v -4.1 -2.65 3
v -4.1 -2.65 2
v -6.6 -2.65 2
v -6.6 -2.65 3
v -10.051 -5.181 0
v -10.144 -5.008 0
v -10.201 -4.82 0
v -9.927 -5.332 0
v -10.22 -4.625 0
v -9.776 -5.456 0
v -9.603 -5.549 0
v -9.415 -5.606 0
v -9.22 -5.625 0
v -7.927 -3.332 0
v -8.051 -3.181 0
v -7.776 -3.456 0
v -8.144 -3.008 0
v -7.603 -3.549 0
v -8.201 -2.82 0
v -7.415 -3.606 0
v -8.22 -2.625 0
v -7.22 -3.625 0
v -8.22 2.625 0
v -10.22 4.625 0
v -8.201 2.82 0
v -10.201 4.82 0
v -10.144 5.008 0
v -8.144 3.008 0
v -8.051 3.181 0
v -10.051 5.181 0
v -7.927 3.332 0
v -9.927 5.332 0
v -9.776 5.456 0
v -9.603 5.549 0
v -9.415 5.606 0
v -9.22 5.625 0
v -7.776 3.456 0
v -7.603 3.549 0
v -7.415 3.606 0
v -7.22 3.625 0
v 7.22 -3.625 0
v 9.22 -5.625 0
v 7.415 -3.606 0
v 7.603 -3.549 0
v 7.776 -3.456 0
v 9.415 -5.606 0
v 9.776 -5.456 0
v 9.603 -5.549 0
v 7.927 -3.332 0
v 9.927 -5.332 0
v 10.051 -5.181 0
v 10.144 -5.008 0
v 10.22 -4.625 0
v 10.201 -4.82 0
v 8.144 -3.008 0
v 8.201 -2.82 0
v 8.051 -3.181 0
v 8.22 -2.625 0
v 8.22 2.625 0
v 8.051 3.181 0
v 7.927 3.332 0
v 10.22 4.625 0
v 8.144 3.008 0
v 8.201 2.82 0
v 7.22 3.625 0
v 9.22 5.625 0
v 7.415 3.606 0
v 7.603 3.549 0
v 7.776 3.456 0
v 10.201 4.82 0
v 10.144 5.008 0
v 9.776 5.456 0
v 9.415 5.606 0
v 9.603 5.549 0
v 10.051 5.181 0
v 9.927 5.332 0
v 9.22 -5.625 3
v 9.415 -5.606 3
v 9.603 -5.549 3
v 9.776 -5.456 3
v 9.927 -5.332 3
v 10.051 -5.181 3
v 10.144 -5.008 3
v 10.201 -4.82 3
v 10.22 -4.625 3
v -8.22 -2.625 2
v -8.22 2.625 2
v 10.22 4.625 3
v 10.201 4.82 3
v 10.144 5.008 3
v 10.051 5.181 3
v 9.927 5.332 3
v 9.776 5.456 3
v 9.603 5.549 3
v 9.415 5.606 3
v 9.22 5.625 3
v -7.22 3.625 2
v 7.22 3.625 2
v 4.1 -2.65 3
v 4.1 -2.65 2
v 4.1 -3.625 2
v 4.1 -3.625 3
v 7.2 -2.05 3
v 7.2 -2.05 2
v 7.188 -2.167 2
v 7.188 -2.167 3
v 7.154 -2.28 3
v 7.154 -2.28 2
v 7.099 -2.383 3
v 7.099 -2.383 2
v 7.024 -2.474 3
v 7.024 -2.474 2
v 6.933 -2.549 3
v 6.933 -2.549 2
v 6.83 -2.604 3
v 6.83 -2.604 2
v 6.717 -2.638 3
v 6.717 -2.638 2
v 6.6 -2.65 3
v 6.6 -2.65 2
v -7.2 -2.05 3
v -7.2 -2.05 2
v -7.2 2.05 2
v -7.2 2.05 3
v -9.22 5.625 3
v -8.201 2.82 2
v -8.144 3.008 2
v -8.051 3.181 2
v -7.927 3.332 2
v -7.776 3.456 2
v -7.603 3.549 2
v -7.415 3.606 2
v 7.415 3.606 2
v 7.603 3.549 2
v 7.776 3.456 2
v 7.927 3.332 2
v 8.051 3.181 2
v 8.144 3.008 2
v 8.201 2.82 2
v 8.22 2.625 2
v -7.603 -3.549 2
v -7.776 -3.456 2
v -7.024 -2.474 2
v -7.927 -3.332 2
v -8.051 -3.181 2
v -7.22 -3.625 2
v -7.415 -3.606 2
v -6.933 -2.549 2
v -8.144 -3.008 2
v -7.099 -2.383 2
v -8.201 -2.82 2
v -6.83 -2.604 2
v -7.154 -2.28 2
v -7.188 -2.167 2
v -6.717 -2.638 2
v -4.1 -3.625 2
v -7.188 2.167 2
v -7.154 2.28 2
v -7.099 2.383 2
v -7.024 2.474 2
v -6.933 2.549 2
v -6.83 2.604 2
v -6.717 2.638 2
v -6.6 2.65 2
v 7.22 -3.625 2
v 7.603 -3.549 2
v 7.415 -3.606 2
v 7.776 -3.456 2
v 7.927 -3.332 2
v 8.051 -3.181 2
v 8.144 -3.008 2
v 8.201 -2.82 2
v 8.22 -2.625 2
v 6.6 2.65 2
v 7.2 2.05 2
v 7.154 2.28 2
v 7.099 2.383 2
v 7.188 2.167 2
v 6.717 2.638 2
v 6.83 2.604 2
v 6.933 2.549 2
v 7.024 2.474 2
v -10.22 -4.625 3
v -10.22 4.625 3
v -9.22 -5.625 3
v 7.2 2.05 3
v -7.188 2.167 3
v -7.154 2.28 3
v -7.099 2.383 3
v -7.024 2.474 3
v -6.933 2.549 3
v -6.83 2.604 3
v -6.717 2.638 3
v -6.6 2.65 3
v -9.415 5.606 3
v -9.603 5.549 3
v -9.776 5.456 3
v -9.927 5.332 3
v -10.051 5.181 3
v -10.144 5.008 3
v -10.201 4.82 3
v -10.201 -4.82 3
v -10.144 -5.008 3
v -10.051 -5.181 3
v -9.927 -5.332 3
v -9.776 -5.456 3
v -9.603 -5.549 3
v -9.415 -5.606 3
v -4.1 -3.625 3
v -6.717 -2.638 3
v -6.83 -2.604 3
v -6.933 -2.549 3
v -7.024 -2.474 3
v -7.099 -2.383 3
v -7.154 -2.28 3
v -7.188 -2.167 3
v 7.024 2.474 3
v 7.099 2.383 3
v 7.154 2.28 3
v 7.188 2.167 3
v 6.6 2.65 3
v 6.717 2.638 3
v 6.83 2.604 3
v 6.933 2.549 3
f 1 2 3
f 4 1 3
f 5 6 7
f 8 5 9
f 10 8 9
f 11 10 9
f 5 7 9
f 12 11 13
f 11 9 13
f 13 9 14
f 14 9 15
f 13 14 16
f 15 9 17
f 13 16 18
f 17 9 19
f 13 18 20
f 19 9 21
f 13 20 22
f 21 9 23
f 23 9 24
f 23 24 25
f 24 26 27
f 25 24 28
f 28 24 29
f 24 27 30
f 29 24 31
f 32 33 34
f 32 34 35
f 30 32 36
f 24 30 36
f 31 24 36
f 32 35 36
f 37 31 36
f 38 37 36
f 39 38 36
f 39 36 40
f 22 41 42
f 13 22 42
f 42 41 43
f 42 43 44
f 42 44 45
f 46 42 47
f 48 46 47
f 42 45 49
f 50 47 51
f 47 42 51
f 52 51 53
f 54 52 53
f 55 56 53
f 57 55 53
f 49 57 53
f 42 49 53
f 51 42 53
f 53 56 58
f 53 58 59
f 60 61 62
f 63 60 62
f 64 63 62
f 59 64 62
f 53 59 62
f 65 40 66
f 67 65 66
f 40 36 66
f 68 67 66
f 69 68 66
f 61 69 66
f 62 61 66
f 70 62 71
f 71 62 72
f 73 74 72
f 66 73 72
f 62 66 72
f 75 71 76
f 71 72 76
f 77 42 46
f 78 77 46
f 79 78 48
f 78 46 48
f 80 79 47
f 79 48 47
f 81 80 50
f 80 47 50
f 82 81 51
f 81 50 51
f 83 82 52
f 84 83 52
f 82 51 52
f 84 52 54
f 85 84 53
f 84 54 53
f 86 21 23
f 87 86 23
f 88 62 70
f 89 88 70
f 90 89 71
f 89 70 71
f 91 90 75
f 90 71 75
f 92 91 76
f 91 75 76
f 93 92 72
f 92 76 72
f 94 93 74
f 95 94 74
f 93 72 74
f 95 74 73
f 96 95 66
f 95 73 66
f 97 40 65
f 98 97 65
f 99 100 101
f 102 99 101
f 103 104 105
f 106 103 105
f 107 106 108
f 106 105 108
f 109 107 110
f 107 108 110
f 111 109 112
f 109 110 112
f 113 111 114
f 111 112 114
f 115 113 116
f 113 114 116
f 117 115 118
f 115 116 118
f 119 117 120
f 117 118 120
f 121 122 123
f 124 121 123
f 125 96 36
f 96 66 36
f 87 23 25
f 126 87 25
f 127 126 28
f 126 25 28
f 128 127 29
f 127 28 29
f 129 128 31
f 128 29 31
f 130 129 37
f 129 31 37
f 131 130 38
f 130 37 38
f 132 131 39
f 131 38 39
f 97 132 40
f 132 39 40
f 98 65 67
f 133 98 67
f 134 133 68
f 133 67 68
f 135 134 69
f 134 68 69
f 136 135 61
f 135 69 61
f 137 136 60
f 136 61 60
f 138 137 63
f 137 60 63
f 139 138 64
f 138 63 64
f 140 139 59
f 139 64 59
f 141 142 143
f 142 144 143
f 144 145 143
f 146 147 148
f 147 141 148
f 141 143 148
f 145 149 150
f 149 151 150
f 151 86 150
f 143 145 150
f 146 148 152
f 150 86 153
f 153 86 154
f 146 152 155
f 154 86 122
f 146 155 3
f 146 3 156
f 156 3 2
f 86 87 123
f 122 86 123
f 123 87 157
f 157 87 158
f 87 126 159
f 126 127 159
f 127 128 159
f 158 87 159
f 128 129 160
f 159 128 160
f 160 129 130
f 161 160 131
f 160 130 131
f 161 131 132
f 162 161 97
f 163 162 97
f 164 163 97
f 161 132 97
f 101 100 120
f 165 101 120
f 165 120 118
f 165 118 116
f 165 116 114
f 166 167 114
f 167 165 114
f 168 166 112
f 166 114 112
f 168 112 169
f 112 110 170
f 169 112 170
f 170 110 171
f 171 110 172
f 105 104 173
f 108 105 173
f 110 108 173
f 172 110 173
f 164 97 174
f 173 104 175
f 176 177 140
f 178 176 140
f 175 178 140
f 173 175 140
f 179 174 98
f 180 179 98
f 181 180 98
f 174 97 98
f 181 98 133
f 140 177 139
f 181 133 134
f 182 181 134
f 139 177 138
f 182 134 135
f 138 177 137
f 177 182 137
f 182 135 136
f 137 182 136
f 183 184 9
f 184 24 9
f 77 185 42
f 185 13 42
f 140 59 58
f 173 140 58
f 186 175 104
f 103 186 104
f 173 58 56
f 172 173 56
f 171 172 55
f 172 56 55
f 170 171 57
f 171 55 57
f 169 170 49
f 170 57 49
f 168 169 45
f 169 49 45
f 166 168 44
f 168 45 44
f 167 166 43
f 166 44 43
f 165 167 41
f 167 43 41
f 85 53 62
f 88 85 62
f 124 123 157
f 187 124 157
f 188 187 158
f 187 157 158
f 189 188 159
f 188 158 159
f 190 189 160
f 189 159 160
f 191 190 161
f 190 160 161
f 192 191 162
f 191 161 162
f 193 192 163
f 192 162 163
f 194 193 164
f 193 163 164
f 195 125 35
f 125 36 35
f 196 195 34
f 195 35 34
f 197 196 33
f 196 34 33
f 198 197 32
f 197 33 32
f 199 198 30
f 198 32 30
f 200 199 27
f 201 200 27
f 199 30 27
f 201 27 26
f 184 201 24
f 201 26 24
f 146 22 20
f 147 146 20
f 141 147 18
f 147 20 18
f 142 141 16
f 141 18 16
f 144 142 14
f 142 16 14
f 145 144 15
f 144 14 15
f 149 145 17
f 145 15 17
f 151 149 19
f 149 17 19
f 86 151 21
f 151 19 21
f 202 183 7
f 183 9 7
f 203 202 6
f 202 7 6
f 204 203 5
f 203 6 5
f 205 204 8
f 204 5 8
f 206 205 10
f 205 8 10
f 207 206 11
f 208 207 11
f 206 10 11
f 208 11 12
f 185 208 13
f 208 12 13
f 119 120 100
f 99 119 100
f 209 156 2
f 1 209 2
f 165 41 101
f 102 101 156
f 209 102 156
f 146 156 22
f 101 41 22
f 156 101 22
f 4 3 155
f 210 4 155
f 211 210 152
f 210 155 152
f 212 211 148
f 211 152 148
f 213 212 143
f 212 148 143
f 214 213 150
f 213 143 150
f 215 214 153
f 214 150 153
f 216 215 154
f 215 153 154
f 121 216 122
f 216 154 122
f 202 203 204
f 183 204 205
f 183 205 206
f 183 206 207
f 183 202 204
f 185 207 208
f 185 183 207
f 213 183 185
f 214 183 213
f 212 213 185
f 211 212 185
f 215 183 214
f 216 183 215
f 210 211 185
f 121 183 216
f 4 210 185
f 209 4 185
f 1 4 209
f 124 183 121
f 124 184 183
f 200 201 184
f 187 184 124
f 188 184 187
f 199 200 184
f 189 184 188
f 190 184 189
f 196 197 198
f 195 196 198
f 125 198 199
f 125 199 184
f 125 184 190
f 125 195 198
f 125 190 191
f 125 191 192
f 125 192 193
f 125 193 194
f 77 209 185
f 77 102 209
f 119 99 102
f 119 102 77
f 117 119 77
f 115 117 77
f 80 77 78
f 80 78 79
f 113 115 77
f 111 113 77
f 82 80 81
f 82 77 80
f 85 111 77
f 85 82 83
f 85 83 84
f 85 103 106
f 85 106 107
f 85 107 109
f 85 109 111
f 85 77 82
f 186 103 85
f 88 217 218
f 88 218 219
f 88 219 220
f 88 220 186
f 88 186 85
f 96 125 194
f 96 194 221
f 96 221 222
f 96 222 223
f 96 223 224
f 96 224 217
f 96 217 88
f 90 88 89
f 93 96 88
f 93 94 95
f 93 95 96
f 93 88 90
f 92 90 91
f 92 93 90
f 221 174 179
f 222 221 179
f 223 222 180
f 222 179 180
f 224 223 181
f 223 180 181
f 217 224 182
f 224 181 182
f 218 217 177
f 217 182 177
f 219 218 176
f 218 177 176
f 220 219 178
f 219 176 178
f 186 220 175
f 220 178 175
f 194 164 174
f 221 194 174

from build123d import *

# Parameters (mm, degrees)
F1_DEPTH = 2
F3_DEPTH = 1
F4_DEPTH = 1


with BuildPart() as f1:
    # F0 (on Top) → F1 (new body)
    with BuildSketch(Plane.XY):
        with BuildLine():
            ThreePointArc((10.22, 4.625), (9.9271067812, 5.3321067812), (9.22, 5.625))
            Line((9.22, 5.625), (-9.22, 5.625))
            ThreePointArc((-9.22, 5.625), (-9.9271067812, 5.3321067812), (-10.22, 4.625))
            Line((-10.22, 4.625), (-10.22, -4.625))
            ThreePointArc((-10.22, -4.625), (-9.9271067812, -5.3321067812), (-9.22, -5.625))
            Line((-9.22, -5.625), (9.22, -5.625))
            ThreePointArc((9.22, -5.625), (9.9271067812, -5.3321067812), (10.22, -4.625))
            Line((10.22, -4.625), (10.22, 4.625))
        make_face()
        with BuildLine():
            Line((-7.22, 3.625), (7.22, 3.625))
            ThreePointArc((7.22, 3.625), (7.9271067812, 3.3321067812), (8.22, 2.625))
            Line((8.22, 2.625), (8.22, -2.625))
            ThreePointArc((8.22, -2.625), (7.9271067812, -3.3321067812), (7.22, -3.625))
            Line((7.22, -3.625), (-7.22, -3.625))
            ThreePointArc((-7.22, -3.625), (-7.9271067812, -3.3321067812), (-8.22, -2.625))
            Line((-8.22, -2.625), (-8.22, 2.625))
            ThreePointArc((-8.22, 2.625), (-7.9271067812, 3.3321067812), (-7.22, 3.625))
        make_face(mode=Mode.SUBTRACT)
    extrude(amount=F1_DEPTH)

    # F2 (on face) → F3 (join)
    with BuildSketch(Plane.XY.offset(2)):
        with BuildLine():
            Line((7.22, 3.625), (-7.22, 3.625))
            ThreePointArc((-7.22, 3.625), (-7.9271067812, 3.3321067812), (-8.22, 2.625))
            Line((-8.22, 2.625), (-8.22, -2.625))
            ThreePointArc((-8.22, -2.625), (-7.9271067812, -3.3321067812), (-7.22, -3.625))
            Line((-7.22, -3.625), (-4.1, -3.625))
            Line((-4.1, -3.625), (-4.1, -2.65))
            Line((-4.1, -2.65), (-6.6, -2.65))
            ThreePointArc((-6.6, -2.65), (-7.0242640687, -2.4742640687), (-7.2, -2.05))
            Line((-7.2, -2.05), (-7.2, 2.05))
            ThreePointArc((-7.2, 2.05), (-7.0242640687, 2.4742640687), (-6.6, 2.65))
            Line((-6.6, 2.65), (6.6, 2.65))
            ThreePointArc((6.6, 2.65), (7.0242640687, 2.4742640687), (7.2, 2.05))
            Line((7.2, 2.05), (7.2, -2.05))
            ThreePointArc((7.2, -2.05), (7.0242640687, -2.4742640687), (6.6, -2.65))
            Line((6.6, -2.65), (4.1, -2.65))
            Line((4.1, -2.65), (4.1, -3.625))
            Line((4.1, -3.625), (7.22, -3.625))
            ThreePointArc((7.22, -3.625), (7.9271067812, -3.3321067812), (8.22, -2.625))
            Line((8.22, -2.625), (8.22, 2.625))
            ThreePointArc((8.22, 2.625), (7.9271067812, 3.3321067812), (7.22, 3.625))
        make_face()
    extrude(amount=F3_DEPTH)

    # F4 (add): a face of the model
    f4_faces = [f1.faces().sort_by_distance(p)[0] for p in [
        (9.9866855984, 0, 2),
    ]]
    extrude(f4_faces, amount=F4_DEPTH)


solid = f1.part
